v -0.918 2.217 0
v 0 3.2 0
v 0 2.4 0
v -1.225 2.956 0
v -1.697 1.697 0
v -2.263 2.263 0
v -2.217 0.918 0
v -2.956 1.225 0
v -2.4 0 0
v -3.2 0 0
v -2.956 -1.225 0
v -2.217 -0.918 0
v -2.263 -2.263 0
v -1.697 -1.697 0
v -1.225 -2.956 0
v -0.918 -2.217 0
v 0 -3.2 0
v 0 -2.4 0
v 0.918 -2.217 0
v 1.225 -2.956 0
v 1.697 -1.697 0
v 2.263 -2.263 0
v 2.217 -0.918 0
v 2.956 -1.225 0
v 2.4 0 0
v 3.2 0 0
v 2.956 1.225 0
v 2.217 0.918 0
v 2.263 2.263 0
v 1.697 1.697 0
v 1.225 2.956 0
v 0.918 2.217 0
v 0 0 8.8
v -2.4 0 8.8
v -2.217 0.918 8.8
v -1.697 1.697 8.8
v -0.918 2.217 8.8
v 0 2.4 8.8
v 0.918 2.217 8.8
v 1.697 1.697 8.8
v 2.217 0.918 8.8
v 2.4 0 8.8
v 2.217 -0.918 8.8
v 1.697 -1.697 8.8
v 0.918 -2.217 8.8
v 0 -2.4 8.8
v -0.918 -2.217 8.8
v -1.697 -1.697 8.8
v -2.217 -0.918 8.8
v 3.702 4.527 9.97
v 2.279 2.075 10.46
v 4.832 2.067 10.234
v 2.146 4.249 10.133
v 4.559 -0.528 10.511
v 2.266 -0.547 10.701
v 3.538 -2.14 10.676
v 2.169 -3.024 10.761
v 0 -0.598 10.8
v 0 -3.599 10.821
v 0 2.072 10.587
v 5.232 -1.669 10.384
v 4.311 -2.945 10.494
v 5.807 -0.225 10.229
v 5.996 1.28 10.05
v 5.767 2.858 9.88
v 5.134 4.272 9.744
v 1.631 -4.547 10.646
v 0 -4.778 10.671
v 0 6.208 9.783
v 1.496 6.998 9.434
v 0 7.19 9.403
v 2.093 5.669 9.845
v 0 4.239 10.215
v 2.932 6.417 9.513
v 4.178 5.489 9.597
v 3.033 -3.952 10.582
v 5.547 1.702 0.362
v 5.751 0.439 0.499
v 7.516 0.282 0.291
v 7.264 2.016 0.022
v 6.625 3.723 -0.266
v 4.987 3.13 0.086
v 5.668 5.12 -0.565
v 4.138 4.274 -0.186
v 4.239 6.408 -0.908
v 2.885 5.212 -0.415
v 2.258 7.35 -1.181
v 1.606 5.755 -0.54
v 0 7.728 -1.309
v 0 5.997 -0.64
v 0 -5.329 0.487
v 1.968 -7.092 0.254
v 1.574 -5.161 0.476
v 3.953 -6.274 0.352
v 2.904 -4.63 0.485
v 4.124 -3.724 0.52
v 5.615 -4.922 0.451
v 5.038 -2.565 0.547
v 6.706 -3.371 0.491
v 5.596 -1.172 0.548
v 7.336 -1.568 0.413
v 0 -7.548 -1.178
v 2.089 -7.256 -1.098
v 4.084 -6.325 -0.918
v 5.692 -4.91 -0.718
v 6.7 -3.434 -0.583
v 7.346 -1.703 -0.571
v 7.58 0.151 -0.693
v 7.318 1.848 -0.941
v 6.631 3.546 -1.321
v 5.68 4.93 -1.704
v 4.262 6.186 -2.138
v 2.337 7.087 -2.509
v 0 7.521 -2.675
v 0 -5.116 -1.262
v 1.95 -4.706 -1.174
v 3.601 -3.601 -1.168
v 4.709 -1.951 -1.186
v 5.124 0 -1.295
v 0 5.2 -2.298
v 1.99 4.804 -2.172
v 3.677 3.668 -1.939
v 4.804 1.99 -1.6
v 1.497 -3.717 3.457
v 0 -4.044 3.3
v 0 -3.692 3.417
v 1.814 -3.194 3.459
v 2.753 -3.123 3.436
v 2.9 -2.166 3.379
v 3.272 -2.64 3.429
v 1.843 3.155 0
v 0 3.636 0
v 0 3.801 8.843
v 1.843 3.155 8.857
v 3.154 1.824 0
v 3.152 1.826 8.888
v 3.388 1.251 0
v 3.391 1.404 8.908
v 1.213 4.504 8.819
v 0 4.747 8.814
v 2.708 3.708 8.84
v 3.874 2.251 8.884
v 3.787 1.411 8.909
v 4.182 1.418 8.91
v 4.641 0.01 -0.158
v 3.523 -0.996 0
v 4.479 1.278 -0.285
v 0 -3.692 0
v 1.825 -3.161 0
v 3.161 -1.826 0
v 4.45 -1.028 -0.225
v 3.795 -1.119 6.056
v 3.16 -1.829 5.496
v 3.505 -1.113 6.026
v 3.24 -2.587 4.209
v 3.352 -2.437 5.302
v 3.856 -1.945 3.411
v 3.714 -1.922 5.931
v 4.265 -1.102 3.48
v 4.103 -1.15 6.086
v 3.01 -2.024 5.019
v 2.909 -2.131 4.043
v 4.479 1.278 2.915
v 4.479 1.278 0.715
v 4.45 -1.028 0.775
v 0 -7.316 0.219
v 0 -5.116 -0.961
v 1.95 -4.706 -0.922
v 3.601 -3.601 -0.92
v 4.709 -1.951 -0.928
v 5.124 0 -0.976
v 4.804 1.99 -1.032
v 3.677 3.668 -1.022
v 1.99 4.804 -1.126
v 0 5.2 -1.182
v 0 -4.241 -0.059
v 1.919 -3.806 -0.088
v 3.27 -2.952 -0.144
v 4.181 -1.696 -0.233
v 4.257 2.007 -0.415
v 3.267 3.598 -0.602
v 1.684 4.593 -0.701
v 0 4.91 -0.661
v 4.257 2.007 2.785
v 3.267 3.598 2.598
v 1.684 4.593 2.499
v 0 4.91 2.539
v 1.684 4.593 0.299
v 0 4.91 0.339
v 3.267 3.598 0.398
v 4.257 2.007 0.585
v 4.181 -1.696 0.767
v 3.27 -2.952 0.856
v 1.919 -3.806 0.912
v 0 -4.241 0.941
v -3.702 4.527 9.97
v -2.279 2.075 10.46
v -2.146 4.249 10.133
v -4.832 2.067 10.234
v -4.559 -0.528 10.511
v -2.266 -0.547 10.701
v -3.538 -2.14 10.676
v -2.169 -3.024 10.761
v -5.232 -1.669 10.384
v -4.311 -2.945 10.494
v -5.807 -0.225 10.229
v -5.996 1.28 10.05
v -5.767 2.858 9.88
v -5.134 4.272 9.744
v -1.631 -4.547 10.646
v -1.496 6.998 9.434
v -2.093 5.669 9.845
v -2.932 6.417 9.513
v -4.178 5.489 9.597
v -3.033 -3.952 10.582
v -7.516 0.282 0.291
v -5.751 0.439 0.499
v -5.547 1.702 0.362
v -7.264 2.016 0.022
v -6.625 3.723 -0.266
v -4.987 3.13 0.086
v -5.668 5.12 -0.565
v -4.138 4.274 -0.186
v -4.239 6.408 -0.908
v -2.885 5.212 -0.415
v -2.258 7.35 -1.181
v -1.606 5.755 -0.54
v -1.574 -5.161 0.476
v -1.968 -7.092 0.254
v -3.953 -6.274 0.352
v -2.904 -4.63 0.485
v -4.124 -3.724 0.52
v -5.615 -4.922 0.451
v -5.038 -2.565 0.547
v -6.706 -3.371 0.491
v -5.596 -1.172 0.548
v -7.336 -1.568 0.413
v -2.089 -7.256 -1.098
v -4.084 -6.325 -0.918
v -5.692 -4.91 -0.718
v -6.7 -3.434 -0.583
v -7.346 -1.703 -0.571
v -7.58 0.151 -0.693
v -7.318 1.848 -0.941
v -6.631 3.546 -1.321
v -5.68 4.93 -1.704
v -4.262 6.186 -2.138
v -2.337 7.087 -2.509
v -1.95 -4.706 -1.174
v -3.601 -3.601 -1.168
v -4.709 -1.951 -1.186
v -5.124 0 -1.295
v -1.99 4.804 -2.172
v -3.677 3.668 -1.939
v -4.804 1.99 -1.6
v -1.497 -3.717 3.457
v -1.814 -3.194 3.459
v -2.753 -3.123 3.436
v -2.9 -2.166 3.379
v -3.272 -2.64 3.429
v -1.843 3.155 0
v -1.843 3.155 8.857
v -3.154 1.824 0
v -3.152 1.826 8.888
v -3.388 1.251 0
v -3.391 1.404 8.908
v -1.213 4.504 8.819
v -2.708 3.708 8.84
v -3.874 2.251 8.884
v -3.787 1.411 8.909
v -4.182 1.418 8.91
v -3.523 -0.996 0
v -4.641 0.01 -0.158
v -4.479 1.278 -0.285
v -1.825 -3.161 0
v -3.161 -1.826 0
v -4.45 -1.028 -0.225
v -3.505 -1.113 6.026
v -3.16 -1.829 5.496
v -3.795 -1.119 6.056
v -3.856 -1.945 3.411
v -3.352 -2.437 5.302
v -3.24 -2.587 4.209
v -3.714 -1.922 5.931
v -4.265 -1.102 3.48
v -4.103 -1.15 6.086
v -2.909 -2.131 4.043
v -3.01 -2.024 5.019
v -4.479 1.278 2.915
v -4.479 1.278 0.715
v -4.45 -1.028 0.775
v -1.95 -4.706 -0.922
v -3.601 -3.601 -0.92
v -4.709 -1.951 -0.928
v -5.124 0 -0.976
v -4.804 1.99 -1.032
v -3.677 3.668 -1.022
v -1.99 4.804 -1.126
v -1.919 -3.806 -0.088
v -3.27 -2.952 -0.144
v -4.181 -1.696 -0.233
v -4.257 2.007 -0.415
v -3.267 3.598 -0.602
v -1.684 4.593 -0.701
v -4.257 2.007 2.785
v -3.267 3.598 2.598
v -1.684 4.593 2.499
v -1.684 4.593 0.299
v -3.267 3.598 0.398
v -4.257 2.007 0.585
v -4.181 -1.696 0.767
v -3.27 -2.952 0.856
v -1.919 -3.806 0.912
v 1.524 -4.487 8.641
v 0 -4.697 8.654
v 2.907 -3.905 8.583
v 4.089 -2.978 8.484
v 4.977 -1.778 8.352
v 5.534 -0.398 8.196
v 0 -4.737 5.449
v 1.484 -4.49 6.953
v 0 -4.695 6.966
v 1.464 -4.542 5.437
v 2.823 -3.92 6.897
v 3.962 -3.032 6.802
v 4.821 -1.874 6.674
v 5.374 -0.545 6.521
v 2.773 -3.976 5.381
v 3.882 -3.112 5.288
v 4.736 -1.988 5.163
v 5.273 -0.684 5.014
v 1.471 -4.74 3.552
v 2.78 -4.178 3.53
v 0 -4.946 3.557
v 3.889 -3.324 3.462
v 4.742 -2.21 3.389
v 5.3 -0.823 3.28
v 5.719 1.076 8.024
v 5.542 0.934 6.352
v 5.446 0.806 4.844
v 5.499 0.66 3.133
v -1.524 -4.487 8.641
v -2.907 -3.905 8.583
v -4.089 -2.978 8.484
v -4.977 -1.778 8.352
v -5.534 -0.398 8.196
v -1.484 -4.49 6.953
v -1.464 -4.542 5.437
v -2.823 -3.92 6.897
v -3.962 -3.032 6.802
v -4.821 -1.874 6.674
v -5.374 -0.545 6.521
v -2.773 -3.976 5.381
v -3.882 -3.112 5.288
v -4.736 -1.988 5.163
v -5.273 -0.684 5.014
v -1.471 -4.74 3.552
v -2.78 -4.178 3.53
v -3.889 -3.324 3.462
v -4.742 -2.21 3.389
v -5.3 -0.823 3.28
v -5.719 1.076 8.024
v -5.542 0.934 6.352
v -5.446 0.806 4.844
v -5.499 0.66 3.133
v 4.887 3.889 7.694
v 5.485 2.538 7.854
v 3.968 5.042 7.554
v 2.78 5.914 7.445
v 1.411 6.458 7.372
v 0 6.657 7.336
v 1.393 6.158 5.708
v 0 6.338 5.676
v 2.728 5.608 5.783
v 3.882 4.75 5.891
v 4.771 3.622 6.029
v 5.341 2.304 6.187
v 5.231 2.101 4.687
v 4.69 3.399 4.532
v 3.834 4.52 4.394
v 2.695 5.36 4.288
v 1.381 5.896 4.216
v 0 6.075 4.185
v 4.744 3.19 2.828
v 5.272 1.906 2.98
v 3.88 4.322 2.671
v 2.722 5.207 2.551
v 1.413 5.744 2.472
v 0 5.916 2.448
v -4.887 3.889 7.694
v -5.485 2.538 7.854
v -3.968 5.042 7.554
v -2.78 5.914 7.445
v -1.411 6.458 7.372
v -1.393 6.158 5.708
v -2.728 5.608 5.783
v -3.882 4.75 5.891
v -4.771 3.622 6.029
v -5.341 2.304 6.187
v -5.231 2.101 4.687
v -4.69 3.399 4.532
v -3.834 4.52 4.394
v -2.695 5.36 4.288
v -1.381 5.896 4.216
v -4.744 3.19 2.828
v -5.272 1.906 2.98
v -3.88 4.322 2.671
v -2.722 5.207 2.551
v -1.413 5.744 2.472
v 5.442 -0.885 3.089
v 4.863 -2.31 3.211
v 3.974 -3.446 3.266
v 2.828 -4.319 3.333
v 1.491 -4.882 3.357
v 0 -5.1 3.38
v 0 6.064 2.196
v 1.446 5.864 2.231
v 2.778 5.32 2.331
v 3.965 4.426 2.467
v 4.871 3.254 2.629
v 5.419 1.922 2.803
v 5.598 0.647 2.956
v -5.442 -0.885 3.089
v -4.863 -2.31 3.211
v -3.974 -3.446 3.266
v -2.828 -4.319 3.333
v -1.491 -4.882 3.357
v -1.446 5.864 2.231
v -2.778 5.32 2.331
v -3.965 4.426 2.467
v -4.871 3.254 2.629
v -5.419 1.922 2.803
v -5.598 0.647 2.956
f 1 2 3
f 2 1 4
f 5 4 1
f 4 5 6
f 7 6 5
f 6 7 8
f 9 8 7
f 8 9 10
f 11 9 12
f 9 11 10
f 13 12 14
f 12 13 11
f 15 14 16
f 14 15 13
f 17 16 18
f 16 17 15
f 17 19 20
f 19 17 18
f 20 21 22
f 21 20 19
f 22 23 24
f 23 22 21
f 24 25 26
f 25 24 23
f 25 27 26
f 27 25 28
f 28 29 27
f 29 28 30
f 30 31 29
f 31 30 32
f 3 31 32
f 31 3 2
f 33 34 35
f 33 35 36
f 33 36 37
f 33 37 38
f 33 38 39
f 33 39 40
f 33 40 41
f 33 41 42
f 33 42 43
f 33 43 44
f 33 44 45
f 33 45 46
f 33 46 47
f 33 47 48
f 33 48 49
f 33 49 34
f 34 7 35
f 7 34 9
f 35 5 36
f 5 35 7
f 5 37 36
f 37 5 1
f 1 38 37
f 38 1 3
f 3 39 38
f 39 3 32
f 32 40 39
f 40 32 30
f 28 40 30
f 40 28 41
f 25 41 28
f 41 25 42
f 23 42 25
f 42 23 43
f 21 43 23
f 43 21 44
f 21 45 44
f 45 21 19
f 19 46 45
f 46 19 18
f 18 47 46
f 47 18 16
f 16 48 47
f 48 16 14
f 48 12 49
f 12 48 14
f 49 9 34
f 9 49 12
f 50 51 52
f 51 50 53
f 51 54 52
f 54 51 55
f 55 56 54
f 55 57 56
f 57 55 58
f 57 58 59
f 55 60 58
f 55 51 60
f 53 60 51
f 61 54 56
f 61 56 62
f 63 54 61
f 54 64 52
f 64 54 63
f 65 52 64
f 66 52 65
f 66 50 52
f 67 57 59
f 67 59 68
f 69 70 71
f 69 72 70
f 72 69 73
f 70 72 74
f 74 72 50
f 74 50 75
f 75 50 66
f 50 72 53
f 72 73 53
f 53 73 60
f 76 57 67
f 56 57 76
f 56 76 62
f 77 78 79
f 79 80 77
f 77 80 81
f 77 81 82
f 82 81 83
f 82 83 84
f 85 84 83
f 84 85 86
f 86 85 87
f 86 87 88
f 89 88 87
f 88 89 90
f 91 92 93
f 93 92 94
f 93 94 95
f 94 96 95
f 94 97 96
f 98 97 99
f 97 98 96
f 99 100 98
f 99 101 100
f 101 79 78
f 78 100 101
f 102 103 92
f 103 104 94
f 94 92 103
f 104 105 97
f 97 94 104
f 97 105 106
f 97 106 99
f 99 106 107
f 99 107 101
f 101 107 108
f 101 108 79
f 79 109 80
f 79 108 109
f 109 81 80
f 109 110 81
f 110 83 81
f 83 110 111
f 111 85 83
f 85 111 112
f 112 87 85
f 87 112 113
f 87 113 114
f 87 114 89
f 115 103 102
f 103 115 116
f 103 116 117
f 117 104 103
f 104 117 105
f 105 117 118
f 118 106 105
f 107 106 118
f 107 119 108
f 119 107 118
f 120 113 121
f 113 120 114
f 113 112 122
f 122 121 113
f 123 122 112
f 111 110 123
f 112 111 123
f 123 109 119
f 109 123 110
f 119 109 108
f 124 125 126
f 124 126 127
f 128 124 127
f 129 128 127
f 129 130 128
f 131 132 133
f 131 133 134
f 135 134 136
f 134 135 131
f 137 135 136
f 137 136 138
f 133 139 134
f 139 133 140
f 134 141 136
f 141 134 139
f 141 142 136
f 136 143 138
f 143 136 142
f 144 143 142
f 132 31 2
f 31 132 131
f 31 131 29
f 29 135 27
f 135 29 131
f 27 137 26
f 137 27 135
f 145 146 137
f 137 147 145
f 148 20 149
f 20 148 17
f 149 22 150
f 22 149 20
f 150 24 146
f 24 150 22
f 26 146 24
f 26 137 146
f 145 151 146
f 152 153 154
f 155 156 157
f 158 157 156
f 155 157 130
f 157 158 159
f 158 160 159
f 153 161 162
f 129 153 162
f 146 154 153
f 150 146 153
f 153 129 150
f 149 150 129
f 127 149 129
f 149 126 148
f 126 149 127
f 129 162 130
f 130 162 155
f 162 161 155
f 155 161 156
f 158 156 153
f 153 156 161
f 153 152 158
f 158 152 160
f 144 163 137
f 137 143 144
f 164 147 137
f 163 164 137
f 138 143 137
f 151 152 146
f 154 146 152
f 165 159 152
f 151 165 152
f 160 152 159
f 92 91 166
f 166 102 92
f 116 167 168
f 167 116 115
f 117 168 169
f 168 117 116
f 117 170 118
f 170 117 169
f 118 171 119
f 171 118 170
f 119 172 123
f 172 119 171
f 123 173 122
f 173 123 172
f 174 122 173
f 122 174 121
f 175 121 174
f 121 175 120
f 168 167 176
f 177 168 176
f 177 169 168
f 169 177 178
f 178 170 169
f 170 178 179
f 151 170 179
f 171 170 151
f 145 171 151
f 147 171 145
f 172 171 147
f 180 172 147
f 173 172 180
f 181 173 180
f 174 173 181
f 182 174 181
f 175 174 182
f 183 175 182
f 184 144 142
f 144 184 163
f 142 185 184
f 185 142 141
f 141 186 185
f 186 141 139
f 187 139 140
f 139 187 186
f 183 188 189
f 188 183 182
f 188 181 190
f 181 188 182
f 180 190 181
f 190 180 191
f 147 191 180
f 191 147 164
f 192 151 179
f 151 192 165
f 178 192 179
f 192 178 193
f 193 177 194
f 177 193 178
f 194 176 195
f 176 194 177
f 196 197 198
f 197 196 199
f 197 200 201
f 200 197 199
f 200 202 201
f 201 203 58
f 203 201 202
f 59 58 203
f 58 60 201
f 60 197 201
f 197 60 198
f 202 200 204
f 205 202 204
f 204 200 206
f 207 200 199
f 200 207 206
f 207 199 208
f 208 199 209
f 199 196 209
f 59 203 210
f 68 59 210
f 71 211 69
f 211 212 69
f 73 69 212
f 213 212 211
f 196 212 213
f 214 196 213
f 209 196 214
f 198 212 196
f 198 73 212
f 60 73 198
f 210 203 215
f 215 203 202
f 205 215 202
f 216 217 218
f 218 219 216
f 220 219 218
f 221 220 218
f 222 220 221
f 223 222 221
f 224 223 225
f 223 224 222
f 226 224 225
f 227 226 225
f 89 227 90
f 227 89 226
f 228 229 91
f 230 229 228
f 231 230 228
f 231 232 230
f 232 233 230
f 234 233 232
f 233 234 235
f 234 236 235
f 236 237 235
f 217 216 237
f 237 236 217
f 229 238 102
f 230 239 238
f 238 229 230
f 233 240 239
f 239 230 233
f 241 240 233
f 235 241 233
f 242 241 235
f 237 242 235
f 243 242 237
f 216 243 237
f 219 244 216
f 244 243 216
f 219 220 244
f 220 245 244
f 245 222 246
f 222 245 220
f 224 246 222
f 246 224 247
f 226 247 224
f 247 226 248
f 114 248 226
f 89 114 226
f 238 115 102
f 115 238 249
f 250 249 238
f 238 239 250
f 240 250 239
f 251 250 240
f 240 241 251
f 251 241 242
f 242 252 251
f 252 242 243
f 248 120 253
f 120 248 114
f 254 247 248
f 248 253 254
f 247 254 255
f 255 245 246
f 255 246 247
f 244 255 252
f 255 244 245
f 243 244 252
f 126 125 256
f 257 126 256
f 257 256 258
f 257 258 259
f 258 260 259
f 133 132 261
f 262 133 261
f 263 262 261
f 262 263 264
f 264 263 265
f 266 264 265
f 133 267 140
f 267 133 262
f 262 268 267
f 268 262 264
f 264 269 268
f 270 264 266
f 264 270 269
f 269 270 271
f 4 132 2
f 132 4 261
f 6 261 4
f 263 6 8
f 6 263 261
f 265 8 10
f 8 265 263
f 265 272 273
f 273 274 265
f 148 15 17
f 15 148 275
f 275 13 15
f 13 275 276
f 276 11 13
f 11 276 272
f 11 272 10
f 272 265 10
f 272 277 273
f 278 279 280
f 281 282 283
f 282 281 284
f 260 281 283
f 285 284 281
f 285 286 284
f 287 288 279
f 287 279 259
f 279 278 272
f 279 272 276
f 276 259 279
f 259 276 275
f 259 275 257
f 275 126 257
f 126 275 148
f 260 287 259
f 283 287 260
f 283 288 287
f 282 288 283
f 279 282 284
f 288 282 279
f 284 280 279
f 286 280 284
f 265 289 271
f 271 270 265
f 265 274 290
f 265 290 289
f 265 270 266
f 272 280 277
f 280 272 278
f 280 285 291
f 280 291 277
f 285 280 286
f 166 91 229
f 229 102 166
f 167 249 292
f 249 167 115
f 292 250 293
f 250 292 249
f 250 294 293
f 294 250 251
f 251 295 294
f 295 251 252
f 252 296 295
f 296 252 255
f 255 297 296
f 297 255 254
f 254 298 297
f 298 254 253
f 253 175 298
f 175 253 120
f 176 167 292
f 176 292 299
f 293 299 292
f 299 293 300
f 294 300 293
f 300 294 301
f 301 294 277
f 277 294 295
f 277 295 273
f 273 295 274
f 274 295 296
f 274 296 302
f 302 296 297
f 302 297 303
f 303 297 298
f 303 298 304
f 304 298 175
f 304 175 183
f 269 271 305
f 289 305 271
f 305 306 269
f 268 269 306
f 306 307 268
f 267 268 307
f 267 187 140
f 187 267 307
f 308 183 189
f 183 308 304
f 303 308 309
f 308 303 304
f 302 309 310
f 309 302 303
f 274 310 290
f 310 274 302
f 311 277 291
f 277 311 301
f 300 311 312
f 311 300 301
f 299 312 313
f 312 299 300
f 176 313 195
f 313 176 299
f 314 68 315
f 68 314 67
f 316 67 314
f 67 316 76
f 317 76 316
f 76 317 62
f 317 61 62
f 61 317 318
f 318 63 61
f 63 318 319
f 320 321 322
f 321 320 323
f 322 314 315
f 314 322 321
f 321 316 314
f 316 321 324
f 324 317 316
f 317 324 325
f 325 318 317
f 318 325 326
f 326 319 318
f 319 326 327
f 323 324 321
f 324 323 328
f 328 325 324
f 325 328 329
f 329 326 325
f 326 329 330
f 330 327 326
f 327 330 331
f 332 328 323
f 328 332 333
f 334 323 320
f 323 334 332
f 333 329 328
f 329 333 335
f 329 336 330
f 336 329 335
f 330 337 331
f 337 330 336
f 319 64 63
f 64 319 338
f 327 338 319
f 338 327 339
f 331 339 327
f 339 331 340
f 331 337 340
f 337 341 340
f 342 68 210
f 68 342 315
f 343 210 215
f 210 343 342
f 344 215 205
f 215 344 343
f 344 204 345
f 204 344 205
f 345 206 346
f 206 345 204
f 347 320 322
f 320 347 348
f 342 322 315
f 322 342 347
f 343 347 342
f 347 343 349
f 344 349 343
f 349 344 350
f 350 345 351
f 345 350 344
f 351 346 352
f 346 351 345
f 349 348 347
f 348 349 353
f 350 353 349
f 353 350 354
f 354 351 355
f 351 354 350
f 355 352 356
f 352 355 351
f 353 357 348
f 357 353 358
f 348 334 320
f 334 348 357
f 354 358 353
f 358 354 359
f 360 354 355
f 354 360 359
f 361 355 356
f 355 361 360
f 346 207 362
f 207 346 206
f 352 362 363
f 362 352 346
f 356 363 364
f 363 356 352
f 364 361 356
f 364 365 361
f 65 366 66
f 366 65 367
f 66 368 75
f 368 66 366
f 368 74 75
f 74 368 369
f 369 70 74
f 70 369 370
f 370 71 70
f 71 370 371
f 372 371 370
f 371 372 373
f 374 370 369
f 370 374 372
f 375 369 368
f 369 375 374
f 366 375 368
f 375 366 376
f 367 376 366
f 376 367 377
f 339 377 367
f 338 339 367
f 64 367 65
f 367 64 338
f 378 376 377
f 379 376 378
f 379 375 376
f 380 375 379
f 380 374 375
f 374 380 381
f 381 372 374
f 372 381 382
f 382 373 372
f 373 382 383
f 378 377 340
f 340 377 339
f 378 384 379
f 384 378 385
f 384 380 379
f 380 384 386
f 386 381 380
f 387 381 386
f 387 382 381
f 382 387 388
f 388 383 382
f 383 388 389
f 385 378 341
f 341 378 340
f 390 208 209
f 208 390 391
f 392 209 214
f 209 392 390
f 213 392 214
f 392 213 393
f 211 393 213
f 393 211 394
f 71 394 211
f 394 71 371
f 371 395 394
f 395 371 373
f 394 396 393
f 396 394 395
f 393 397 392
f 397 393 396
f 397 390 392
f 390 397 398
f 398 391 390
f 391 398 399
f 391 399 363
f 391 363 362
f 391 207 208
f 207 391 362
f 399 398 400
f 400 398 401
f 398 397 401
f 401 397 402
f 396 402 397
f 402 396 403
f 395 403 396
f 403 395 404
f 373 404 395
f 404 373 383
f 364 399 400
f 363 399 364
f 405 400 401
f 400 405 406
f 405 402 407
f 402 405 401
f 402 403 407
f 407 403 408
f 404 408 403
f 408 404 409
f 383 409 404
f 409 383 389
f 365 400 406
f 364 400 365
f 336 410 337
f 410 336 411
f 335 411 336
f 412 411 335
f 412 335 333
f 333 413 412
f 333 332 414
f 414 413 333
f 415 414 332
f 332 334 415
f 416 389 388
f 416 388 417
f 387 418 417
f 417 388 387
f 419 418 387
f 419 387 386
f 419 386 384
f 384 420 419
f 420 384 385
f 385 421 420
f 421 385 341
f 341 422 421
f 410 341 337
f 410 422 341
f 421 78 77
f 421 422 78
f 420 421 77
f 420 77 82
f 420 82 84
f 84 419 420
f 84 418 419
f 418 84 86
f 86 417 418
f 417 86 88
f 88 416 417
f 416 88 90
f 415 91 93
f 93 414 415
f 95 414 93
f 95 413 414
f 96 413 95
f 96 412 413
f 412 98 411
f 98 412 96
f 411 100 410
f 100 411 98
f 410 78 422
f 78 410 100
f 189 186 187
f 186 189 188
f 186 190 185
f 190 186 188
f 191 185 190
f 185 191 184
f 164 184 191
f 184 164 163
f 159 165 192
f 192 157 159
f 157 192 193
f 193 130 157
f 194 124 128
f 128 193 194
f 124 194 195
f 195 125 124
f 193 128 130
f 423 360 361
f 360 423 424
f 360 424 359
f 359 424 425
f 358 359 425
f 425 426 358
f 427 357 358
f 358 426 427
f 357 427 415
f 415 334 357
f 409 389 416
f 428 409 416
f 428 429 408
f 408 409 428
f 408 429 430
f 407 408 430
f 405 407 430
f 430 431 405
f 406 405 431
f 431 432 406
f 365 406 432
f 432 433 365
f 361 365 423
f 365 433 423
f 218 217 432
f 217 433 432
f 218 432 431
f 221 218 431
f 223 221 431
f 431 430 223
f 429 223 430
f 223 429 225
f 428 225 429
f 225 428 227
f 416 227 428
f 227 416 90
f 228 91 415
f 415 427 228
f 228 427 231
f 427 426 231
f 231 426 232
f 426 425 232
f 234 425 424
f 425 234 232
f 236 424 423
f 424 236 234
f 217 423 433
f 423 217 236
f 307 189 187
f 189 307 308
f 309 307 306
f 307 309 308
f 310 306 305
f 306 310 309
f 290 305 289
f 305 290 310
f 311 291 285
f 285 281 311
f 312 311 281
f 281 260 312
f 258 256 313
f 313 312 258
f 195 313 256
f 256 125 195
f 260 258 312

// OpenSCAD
use <../lib.scad>
use <s/101777s01.scad>
use <s/101777s02.scad>
use <s/101777s04.scad>
use <s/101777s05.scad>
function ldraw_lib__101777p01() = [
// 0 Minifig Top Hat with Bright Light Orange Band Pattern
// 0 Name: 101777p01.dat
// 0 Author: Philippe Hurbain [Philo]
// 0 !LDRAW_ORG Part UPDATE 2023-07
// 0 !LICENSE Licensed under CC BY 4.0 : see CAreadme.txt
// 
// 0 BFC CERTIFY CCW
  [0,"BFC","CERTIFY"],
  [0,"BFC","CCW"],
// 
// 0 !CATEGORY Minifig Headwear
// 0 !KEYWORDS Bricklink 101777pb01, CMF, Disney 100, Jiminy Cricket, Set 71038-3
// 
// 0 !HISTORY 2023-05-12 {LEGO Instructions App} Original part shape
// 0 !HISTORY 2023-05-15 [Philo] File preparation for LDraw Parts Tracker
// 0 !HISTORY 2023-12-31 [OrionP] Official Update 2023-07
// 
// 
// 1 16 0 0 0 1 0 0 0 1 0 0 0 1 s\101777s01.dat
  [1,16,0,0,0,1,0,0,0,1,0,0,0,1, ldraw_lib__s__101777s01()],
// 1 16 0 0 0 1 0 0 0 1 0 0 0 1 s\101777s04.dat
  [1,16,0,0,0,1,0,0,0,1,0,0,0,1, ldraw_lib__s__101777s04()],
// 1 16 0 0 0 -1 0 0 0 1 0 0 0 1 s\101777s04.dat
  [1,16,0,0,0,-1,0,0,0,1,0,0,0,1, ldraw_lib__s__101777s04()],
// 1 16 0 0 0 1 0 0 0 1 0 0 0 1 s\101777s05.dat
  [1,16,0,0,0,1,0,0,0,1,0,0,0,1, ldraw_lib__s__101777s05()],
// 1 16 0 0 0 -1 0 0 0 1 0 0 0 1 s\101777s05.dat
  [1,16,0,0,0,-1,0,0,0,1,0,0,0,1, ldraw_lib__s__101777s05()],
// 1 191 0 0 0 1 0 0 0 1 0 0 0 1 s\101777s02.dat
  [1,191,0,0,0,1,0,0,0,1,0,0,0,1, ldraw_lib__s__101777s02()],
// 1 191 0 0 0 -1 0 0 0 1 0 0 0 1 s\101777s02.dat
  [1,191,0,0,0,-1,0,0,0,1,0,0,0,1, ldraw_lib__s__101777s02()],
];
module ldraw_lib__101777p01(step=0, col=false, unit=2/5, alt=false, line=0.2, solid=!$preview)
    makepoly(ldraw_lib__101777p01(), step=step, col=col, unit=unit, alt=alt, line=line, solid=solid);
ldraw_lib__101777p01(line=0.2);
